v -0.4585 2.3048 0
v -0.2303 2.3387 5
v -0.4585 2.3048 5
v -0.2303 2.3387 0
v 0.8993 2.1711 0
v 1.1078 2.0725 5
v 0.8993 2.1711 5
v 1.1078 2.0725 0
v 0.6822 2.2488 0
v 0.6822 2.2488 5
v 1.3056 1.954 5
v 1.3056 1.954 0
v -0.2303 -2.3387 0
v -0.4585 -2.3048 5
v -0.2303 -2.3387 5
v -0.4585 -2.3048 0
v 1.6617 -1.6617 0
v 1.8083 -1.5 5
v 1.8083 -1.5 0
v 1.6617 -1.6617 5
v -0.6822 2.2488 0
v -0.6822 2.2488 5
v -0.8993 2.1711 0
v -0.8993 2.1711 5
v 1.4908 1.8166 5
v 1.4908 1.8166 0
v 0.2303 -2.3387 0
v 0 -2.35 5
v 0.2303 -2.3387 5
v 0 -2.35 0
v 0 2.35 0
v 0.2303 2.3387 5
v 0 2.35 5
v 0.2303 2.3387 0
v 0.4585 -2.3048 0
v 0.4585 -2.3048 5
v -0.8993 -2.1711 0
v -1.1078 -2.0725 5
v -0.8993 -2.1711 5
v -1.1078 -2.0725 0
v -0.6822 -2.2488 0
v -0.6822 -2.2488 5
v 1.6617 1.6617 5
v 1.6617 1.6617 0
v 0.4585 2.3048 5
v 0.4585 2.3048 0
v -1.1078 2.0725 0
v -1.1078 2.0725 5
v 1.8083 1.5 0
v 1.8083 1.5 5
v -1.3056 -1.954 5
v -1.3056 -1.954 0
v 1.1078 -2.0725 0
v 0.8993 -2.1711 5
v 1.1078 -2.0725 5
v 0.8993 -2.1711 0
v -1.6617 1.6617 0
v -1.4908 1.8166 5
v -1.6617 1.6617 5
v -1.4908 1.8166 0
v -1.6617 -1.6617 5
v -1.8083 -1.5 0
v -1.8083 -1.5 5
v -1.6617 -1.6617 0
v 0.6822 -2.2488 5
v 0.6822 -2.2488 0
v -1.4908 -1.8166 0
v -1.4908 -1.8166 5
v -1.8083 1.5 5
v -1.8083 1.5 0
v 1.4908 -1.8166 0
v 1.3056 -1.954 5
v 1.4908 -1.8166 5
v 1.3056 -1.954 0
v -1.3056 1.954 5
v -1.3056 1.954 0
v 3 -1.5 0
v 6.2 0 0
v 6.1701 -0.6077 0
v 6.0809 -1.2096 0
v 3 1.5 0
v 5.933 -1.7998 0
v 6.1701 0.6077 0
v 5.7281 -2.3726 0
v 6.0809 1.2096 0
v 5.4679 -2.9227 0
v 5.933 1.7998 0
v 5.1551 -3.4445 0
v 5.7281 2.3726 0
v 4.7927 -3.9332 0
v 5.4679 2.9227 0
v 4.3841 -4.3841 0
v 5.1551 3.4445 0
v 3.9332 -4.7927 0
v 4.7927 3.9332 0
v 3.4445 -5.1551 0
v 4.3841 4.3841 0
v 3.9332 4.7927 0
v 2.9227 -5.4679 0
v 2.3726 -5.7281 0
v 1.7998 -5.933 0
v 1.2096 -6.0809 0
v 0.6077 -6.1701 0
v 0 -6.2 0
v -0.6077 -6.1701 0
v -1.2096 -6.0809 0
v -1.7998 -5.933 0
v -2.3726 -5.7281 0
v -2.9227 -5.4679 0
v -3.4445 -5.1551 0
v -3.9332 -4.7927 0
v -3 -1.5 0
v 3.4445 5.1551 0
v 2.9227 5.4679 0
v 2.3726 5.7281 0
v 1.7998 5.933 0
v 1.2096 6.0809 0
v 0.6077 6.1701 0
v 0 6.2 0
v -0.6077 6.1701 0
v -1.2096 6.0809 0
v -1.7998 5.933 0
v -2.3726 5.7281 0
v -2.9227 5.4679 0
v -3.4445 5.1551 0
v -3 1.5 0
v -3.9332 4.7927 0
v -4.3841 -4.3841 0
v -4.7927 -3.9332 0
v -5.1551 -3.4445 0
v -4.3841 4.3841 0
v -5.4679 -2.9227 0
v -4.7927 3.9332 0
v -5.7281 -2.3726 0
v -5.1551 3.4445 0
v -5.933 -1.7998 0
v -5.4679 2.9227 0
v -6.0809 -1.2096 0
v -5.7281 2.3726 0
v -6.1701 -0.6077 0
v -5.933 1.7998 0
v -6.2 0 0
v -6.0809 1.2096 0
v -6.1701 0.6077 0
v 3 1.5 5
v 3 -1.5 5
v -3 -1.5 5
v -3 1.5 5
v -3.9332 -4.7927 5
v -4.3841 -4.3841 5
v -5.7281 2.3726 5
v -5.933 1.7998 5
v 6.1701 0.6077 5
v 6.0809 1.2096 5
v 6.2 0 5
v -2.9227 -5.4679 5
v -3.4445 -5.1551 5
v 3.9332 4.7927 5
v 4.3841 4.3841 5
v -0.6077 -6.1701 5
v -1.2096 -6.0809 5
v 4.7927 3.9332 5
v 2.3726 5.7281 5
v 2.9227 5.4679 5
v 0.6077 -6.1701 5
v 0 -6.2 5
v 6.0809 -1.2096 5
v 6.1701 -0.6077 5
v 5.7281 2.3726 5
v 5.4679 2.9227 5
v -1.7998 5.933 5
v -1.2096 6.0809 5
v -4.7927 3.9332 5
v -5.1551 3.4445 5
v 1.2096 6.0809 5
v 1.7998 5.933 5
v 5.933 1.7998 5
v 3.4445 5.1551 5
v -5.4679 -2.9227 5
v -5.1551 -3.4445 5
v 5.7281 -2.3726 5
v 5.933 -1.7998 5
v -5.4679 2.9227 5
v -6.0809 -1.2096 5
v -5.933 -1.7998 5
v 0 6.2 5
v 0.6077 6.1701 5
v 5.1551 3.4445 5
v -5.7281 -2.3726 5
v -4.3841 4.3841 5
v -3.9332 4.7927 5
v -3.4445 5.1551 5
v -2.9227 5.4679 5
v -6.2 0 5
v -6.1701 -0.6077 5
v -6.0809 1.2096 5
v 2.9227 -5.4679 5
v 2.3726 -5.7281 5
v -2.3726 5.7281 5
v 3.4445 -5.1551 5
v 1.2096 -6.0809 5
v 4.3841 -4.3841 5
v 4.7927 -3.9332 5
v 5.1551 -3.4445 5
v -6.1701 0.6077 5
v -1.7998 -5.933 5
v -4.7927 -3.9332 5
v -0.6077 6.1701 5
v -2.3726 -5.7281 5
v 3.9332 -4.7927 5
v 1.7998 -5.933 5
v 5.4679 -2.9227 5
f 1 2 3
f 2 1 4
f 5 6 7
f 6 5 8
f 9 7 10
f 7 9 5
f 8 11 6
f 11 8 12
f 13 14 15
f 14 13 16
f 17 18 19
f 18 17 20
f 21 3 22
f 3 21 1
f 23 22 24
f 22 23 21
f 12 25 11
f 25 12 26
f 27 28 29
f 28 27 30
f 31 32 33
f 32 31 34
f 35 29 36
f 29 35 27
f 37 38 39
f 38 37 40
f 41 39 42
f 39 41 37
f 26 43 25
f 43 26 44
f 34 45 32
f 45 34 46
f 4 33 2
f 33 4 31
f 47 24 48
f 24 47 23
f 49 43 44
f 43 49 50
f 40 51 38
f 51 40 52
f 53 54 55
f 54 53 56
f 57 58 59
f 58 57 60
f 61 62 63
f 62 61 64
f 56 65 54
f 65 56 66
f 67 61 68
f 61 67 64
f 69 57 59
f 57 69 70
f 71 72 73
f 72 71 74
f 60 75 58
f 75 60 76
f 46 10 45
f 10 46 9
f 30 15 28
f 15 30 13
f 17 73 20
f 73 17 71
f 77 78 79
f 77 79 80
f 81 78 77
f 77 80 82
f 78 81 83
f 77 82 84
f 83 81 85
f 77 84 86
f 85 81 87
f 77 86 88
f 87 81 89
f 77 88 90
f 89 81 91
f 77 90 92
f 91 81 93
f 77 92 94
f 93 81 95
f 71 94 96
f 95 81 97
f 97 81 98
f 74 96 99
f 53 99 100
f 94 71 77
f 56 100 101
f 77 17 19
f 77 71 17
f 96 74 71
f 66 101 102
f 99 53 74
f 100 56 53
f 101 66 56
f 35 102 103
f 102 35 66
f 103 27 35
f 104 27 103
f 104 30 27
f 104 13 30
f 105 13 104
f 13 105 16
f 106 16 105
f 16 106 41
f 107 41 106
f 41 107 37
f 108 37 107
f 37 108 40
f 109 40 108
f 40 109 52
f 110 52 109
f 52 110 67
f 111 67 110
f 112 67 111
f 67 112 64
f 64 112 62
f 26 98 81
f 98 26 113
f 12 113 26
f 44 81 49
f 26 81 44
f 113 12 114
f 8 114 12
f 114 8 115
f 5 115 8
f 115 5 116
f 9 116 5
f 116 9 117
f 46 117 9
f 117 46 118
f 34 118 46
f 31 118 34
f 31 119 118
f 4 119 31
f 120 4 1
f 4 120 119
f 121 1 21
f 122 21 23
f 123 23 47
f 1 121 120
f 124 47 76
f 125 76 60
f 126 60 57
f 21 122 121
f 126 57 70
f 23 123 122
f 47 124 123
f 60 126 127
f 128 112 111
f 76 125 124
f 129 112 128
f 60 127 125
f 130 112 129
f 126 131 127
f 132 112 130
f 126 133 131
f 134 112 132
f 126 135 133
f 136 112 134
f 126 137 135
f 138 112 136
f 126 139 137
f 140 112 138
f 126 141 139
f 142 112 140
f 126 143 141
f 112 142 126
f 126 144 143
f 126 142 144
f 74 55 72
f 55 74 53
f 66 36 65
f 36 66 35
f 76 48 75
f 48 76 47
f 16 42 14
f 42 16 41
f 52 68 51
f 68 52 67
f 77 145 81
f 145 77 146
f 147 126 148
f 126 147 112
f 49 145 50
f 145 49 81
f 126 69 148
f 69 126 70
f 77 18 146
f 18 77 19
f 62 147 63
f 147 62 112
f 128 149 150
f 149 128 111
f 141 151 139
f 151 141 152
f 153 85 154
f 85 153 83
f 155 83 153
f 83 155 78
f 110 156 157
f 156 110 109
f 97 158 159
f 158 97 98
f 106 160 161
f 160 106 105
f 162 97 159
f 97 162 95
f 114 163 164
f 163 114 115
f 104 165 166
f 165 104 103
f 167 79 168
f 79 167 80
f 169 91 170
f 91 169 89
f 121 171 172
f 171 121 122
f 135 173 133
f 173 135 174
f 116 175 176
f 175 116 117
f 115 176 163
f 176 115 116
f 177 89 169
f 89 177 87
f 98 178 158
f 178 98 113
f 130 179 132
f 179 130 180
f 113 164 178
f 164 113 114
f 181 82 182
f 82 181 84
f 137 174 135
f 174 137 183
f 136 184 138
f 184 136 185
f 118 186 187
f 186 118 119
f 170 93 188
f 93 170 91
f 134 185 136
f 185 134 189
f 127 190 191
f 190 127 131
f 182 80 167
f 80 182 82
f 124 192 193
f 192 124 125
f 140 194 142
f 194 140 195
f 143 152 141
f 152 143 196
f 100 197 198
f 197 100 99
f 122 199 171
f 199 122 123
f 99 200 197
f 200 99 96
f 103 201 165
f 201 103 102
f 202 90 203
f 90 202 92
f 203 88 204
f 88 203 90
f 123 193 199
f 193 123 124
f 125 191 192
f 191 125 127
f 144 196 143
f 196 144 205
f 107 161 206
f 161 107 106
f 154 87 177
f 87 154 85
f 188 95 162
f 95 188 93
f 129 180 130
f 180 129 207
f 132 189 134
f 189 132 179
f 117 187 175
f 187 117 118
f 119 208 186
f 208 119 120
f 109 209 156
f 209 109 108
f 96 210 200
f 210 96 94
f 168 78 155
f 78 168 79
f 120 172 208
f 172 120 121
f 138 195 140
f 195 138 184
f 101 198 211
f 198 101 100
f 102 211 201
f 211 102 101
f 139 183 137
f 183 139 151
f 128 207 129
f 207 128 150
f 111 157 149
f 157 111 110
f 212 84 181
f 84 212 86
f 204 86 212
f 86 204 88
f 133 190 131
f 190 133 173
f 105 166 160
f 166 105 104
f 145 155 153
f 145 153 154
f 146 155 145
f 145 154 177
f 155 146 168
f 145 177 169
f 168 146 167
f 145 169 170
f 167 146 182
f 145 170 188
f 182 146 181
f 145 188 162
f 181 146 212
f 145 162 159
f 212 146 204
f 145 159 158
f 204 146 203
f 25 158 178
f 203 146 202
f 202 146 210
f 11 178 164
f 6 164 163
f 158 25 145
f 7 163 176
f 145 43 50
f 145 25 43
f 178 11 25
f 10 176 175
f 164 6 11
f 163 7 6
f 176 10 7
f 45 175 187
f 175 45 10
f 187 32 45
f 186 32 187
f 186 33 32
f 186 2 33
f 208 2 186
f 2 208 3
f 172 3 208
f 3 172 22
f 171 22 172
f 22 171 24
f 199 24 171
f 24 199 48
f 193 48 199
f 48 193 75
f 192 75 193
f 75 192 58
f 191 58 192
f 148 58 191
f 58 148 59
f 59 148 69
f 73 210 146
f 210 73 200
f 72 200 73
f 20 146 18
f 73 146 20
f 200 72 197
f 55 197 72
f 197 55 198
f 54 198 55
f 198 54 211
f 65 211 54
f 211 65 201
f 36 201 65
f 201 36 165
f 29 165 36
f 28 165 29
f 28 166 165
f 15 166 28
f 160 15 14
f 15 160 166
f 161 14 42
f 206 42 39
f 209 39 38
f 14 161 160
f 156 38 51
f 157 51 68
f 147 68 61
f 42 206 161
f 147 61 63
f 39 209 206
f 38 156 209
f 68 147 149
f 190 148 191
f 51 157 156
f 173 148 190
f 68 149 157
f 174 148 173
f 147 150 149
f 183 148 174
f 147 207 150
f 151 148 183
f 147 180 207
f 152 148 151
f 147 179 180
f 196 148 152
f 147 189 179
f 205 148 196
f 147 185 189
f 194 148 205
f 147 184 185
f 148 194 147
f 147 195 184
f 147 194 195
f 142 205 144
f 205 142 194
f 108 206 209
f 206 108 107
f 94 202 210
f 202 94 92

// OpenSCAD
$fn=64;

difference() {
  union() {
    cylinder(h=5, d=12.4);
  }
  union() {
    // #0 Philips or 1/8 Slot
//    cylinder(h=20, d=3.3);
//    translate([0, 0, 10]) cube([3.7, 2.3, 20], center=true);    

    // #1 Philips or 3/16 Slot
    cylinder(h=20, d=4.7);
    translate([0, 0, 10]) cube([6, 3, 20], center=true);    

    // #2 Philips or 1/4 Slot
//    cylinder(h=20, d=6.4);
//    translate([0, 0, 10]) cube([7.9, 4.3, 20], center=true);    

    // #3 Philips or 5/16 Slot
//    cylinder(h=20, d=8);
//    translate([0, 0, 10]) cube([9.7, 5.4, 20], center=true);    
  }
}
